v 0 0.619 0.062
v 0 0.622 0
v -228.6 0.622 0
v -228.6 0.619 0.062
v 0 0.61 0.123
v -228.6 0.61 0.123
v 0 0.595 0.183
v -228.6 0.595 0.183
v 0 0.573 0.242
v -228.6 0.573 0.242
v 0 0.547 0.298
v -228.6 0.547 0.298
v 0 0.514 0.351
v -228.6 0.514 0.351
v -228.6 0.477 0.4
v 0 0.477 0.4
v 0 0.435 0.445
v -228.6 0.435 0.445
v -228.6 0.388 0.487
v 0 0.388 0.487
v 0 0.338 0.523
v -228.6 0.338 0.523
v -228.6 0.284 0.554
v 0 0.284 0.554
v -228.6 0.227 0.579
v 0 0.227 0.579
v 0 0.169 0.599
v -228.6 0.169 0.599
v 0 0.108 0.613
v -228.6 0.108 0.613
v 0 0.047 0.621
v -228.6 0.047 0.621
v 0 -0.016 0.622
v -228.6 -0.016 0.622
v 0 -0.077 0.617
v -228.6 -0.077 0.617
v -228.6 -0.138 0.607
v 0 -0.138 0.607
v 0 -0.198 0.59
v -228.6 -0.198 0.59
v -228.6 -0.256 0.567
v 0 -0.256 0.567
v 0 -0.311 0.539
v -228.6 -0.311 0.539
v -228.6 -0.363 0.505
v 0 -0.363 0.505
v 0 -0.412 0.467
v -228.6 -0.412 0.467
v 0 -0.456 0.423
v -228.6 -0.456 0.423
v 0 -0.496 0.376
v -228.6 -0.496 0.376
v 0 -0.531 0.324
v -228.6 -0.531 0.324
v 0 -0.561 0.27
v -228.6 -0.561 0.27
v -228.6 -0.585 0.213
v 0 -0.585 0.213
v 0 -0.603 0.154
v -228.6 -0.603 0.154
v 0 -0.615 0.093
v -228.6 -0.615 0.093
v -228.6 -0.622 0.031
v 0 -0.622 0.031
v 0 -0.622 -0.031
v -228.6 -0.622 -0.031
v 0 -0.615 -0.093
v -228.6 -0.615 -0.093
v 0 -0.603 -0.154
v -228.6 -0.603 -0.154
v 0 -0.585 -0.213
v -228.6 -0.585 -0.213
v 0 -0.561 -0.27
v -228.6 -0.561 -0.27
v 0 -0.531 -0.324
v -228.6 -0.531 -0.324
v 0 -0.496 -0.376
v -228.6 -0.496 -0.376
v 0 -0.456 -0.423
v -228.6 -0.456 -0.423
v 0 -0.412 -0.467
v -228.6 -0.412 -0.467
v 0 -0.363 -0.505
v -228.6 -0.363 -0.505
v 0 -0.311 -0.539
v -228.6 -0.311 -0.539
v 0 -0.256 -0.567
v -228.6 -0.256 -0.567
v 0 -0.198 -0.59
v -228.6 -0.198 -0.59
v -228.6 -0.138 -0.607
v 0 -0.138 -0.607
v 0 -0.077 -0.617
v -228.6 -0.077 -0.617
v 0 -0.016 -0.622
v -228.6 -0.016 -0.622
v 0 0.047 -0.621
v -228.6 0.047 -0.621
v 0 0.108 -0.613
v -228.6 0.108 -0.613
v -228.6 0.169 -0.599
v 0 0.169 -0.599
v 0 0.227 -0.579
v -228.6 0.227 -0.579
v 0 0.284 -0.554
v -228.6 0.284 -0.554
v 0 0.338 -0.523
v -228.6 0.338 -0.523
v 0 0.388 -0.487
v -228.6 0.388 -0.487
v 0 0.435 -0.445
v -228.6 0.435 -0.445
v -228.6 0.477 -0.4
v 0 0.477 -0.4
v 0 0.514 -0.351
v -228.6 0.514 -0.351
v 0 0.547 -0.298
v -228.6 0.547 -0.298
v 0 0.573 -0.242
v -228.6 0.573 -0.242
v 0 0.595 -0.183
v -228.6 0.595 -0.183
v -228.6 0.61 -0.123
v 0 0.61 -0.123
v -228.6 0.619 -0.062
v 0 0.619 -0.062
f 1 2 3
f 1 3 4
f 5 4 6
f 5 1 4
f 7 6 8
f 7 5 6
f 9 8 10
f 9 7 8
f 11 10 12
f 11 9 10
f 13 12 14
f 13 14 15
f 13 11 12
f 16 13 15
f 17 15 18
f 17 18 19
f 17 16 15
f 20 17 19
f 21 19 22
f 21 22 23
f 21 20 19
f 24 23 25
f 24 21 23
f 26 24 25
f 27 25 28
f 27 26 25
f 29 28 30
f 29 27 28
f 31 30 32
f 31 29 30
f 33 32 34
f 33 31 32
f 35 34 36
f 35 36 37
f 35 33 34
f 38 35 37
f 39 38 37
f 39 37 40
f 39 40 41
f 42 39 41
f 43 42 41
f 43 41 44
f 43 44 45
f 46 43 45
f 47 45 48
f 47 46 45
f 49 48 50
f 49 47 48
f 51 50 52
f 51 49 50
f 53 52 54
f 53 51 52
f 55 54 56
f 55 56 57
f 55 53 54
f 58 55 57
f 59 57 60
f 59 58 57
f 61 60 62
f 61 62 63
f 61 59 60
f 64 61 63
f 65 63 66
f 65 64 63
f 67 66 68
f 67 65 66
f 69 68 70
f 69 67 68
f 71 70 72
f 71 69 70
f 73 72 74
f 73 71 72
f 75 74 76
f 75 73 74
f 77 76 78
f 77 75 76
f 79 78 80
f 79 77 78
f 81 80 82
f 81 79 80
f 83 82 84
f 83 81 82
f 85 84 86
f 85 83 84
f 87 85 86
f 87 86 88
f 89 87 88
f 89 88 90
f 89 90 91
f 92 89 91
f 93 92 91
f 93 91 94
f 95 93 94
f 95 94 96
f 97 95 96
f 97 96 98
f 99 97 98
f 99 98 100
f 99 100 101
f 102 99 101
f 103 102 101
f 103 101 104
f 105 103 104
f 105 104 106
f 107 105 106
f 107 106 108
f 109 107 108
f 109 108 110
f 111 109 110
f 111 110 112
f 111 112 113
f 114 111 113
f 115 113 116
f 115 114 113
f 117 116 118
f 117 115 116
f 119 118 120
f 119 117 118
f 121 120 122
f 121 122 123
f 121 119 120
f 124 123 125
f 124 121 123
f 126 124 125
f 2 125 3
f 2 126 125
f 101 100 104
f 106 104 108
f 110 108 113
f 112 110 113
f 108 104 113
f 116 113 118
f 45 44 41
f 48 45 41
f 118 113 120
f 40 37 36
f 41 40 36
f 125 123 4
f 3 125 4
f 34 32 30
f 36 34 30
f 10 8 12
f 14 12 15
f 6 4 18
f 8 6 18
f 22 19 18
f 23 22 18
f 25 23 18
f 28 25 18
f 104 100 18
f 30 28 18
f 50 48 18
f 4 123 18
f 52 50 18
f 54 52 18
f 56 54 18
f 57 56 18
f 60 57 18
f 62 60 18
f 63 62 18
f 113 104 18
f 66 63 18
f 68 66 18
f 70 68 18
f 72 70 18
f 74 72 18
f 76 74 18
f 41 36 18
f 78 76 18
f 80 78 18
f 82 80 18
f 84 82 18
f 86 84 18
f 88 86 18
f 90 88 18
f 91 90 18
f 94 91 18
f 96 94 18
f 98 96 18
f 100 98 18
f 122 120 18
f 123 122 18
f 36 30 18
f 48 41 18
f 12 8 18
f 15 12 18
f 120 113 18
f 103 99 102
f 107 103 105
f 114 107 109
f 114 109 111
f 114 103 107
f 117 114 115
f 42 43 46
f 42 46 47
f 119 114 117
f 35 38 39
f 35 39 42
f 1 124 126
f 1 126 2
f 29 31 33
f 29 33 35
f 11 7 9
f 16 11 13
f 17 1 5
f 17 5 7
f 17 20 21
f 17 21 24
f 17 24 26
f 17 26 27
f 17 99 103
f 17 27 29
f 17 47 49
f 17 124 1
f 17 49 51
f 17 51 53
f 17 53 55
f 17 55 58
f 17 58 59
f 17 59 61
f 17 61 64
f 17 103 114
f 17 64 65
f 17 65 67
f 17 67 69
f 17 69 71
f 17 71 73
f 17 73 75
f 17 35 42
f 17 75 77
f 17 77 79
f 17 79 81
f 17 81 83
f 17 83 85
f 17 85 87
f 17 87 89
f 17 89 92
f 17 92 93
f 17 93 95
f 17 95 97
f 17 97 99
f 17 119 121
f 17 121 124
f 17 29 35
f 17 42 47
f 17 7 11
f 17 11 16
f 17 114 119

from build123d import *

# Parameters (mm, degrees)
F0_R     = 0.6223
F1_DEPTH = 228.6


with BuildPart() as f1:
    # F0 (on Right) → F1 (new body)
    with BuildSketch(Plane.YZ):
        Circle(F0_R)
    extrude(amount=-F1_DEPTH)


with BuildPart() as f2_1:
    # F2: copy of F1
    add(f1.part)


with BuildPart() as f3_1:
    # F3: copy of F1
    add(f1.part)


solid = f1.part
